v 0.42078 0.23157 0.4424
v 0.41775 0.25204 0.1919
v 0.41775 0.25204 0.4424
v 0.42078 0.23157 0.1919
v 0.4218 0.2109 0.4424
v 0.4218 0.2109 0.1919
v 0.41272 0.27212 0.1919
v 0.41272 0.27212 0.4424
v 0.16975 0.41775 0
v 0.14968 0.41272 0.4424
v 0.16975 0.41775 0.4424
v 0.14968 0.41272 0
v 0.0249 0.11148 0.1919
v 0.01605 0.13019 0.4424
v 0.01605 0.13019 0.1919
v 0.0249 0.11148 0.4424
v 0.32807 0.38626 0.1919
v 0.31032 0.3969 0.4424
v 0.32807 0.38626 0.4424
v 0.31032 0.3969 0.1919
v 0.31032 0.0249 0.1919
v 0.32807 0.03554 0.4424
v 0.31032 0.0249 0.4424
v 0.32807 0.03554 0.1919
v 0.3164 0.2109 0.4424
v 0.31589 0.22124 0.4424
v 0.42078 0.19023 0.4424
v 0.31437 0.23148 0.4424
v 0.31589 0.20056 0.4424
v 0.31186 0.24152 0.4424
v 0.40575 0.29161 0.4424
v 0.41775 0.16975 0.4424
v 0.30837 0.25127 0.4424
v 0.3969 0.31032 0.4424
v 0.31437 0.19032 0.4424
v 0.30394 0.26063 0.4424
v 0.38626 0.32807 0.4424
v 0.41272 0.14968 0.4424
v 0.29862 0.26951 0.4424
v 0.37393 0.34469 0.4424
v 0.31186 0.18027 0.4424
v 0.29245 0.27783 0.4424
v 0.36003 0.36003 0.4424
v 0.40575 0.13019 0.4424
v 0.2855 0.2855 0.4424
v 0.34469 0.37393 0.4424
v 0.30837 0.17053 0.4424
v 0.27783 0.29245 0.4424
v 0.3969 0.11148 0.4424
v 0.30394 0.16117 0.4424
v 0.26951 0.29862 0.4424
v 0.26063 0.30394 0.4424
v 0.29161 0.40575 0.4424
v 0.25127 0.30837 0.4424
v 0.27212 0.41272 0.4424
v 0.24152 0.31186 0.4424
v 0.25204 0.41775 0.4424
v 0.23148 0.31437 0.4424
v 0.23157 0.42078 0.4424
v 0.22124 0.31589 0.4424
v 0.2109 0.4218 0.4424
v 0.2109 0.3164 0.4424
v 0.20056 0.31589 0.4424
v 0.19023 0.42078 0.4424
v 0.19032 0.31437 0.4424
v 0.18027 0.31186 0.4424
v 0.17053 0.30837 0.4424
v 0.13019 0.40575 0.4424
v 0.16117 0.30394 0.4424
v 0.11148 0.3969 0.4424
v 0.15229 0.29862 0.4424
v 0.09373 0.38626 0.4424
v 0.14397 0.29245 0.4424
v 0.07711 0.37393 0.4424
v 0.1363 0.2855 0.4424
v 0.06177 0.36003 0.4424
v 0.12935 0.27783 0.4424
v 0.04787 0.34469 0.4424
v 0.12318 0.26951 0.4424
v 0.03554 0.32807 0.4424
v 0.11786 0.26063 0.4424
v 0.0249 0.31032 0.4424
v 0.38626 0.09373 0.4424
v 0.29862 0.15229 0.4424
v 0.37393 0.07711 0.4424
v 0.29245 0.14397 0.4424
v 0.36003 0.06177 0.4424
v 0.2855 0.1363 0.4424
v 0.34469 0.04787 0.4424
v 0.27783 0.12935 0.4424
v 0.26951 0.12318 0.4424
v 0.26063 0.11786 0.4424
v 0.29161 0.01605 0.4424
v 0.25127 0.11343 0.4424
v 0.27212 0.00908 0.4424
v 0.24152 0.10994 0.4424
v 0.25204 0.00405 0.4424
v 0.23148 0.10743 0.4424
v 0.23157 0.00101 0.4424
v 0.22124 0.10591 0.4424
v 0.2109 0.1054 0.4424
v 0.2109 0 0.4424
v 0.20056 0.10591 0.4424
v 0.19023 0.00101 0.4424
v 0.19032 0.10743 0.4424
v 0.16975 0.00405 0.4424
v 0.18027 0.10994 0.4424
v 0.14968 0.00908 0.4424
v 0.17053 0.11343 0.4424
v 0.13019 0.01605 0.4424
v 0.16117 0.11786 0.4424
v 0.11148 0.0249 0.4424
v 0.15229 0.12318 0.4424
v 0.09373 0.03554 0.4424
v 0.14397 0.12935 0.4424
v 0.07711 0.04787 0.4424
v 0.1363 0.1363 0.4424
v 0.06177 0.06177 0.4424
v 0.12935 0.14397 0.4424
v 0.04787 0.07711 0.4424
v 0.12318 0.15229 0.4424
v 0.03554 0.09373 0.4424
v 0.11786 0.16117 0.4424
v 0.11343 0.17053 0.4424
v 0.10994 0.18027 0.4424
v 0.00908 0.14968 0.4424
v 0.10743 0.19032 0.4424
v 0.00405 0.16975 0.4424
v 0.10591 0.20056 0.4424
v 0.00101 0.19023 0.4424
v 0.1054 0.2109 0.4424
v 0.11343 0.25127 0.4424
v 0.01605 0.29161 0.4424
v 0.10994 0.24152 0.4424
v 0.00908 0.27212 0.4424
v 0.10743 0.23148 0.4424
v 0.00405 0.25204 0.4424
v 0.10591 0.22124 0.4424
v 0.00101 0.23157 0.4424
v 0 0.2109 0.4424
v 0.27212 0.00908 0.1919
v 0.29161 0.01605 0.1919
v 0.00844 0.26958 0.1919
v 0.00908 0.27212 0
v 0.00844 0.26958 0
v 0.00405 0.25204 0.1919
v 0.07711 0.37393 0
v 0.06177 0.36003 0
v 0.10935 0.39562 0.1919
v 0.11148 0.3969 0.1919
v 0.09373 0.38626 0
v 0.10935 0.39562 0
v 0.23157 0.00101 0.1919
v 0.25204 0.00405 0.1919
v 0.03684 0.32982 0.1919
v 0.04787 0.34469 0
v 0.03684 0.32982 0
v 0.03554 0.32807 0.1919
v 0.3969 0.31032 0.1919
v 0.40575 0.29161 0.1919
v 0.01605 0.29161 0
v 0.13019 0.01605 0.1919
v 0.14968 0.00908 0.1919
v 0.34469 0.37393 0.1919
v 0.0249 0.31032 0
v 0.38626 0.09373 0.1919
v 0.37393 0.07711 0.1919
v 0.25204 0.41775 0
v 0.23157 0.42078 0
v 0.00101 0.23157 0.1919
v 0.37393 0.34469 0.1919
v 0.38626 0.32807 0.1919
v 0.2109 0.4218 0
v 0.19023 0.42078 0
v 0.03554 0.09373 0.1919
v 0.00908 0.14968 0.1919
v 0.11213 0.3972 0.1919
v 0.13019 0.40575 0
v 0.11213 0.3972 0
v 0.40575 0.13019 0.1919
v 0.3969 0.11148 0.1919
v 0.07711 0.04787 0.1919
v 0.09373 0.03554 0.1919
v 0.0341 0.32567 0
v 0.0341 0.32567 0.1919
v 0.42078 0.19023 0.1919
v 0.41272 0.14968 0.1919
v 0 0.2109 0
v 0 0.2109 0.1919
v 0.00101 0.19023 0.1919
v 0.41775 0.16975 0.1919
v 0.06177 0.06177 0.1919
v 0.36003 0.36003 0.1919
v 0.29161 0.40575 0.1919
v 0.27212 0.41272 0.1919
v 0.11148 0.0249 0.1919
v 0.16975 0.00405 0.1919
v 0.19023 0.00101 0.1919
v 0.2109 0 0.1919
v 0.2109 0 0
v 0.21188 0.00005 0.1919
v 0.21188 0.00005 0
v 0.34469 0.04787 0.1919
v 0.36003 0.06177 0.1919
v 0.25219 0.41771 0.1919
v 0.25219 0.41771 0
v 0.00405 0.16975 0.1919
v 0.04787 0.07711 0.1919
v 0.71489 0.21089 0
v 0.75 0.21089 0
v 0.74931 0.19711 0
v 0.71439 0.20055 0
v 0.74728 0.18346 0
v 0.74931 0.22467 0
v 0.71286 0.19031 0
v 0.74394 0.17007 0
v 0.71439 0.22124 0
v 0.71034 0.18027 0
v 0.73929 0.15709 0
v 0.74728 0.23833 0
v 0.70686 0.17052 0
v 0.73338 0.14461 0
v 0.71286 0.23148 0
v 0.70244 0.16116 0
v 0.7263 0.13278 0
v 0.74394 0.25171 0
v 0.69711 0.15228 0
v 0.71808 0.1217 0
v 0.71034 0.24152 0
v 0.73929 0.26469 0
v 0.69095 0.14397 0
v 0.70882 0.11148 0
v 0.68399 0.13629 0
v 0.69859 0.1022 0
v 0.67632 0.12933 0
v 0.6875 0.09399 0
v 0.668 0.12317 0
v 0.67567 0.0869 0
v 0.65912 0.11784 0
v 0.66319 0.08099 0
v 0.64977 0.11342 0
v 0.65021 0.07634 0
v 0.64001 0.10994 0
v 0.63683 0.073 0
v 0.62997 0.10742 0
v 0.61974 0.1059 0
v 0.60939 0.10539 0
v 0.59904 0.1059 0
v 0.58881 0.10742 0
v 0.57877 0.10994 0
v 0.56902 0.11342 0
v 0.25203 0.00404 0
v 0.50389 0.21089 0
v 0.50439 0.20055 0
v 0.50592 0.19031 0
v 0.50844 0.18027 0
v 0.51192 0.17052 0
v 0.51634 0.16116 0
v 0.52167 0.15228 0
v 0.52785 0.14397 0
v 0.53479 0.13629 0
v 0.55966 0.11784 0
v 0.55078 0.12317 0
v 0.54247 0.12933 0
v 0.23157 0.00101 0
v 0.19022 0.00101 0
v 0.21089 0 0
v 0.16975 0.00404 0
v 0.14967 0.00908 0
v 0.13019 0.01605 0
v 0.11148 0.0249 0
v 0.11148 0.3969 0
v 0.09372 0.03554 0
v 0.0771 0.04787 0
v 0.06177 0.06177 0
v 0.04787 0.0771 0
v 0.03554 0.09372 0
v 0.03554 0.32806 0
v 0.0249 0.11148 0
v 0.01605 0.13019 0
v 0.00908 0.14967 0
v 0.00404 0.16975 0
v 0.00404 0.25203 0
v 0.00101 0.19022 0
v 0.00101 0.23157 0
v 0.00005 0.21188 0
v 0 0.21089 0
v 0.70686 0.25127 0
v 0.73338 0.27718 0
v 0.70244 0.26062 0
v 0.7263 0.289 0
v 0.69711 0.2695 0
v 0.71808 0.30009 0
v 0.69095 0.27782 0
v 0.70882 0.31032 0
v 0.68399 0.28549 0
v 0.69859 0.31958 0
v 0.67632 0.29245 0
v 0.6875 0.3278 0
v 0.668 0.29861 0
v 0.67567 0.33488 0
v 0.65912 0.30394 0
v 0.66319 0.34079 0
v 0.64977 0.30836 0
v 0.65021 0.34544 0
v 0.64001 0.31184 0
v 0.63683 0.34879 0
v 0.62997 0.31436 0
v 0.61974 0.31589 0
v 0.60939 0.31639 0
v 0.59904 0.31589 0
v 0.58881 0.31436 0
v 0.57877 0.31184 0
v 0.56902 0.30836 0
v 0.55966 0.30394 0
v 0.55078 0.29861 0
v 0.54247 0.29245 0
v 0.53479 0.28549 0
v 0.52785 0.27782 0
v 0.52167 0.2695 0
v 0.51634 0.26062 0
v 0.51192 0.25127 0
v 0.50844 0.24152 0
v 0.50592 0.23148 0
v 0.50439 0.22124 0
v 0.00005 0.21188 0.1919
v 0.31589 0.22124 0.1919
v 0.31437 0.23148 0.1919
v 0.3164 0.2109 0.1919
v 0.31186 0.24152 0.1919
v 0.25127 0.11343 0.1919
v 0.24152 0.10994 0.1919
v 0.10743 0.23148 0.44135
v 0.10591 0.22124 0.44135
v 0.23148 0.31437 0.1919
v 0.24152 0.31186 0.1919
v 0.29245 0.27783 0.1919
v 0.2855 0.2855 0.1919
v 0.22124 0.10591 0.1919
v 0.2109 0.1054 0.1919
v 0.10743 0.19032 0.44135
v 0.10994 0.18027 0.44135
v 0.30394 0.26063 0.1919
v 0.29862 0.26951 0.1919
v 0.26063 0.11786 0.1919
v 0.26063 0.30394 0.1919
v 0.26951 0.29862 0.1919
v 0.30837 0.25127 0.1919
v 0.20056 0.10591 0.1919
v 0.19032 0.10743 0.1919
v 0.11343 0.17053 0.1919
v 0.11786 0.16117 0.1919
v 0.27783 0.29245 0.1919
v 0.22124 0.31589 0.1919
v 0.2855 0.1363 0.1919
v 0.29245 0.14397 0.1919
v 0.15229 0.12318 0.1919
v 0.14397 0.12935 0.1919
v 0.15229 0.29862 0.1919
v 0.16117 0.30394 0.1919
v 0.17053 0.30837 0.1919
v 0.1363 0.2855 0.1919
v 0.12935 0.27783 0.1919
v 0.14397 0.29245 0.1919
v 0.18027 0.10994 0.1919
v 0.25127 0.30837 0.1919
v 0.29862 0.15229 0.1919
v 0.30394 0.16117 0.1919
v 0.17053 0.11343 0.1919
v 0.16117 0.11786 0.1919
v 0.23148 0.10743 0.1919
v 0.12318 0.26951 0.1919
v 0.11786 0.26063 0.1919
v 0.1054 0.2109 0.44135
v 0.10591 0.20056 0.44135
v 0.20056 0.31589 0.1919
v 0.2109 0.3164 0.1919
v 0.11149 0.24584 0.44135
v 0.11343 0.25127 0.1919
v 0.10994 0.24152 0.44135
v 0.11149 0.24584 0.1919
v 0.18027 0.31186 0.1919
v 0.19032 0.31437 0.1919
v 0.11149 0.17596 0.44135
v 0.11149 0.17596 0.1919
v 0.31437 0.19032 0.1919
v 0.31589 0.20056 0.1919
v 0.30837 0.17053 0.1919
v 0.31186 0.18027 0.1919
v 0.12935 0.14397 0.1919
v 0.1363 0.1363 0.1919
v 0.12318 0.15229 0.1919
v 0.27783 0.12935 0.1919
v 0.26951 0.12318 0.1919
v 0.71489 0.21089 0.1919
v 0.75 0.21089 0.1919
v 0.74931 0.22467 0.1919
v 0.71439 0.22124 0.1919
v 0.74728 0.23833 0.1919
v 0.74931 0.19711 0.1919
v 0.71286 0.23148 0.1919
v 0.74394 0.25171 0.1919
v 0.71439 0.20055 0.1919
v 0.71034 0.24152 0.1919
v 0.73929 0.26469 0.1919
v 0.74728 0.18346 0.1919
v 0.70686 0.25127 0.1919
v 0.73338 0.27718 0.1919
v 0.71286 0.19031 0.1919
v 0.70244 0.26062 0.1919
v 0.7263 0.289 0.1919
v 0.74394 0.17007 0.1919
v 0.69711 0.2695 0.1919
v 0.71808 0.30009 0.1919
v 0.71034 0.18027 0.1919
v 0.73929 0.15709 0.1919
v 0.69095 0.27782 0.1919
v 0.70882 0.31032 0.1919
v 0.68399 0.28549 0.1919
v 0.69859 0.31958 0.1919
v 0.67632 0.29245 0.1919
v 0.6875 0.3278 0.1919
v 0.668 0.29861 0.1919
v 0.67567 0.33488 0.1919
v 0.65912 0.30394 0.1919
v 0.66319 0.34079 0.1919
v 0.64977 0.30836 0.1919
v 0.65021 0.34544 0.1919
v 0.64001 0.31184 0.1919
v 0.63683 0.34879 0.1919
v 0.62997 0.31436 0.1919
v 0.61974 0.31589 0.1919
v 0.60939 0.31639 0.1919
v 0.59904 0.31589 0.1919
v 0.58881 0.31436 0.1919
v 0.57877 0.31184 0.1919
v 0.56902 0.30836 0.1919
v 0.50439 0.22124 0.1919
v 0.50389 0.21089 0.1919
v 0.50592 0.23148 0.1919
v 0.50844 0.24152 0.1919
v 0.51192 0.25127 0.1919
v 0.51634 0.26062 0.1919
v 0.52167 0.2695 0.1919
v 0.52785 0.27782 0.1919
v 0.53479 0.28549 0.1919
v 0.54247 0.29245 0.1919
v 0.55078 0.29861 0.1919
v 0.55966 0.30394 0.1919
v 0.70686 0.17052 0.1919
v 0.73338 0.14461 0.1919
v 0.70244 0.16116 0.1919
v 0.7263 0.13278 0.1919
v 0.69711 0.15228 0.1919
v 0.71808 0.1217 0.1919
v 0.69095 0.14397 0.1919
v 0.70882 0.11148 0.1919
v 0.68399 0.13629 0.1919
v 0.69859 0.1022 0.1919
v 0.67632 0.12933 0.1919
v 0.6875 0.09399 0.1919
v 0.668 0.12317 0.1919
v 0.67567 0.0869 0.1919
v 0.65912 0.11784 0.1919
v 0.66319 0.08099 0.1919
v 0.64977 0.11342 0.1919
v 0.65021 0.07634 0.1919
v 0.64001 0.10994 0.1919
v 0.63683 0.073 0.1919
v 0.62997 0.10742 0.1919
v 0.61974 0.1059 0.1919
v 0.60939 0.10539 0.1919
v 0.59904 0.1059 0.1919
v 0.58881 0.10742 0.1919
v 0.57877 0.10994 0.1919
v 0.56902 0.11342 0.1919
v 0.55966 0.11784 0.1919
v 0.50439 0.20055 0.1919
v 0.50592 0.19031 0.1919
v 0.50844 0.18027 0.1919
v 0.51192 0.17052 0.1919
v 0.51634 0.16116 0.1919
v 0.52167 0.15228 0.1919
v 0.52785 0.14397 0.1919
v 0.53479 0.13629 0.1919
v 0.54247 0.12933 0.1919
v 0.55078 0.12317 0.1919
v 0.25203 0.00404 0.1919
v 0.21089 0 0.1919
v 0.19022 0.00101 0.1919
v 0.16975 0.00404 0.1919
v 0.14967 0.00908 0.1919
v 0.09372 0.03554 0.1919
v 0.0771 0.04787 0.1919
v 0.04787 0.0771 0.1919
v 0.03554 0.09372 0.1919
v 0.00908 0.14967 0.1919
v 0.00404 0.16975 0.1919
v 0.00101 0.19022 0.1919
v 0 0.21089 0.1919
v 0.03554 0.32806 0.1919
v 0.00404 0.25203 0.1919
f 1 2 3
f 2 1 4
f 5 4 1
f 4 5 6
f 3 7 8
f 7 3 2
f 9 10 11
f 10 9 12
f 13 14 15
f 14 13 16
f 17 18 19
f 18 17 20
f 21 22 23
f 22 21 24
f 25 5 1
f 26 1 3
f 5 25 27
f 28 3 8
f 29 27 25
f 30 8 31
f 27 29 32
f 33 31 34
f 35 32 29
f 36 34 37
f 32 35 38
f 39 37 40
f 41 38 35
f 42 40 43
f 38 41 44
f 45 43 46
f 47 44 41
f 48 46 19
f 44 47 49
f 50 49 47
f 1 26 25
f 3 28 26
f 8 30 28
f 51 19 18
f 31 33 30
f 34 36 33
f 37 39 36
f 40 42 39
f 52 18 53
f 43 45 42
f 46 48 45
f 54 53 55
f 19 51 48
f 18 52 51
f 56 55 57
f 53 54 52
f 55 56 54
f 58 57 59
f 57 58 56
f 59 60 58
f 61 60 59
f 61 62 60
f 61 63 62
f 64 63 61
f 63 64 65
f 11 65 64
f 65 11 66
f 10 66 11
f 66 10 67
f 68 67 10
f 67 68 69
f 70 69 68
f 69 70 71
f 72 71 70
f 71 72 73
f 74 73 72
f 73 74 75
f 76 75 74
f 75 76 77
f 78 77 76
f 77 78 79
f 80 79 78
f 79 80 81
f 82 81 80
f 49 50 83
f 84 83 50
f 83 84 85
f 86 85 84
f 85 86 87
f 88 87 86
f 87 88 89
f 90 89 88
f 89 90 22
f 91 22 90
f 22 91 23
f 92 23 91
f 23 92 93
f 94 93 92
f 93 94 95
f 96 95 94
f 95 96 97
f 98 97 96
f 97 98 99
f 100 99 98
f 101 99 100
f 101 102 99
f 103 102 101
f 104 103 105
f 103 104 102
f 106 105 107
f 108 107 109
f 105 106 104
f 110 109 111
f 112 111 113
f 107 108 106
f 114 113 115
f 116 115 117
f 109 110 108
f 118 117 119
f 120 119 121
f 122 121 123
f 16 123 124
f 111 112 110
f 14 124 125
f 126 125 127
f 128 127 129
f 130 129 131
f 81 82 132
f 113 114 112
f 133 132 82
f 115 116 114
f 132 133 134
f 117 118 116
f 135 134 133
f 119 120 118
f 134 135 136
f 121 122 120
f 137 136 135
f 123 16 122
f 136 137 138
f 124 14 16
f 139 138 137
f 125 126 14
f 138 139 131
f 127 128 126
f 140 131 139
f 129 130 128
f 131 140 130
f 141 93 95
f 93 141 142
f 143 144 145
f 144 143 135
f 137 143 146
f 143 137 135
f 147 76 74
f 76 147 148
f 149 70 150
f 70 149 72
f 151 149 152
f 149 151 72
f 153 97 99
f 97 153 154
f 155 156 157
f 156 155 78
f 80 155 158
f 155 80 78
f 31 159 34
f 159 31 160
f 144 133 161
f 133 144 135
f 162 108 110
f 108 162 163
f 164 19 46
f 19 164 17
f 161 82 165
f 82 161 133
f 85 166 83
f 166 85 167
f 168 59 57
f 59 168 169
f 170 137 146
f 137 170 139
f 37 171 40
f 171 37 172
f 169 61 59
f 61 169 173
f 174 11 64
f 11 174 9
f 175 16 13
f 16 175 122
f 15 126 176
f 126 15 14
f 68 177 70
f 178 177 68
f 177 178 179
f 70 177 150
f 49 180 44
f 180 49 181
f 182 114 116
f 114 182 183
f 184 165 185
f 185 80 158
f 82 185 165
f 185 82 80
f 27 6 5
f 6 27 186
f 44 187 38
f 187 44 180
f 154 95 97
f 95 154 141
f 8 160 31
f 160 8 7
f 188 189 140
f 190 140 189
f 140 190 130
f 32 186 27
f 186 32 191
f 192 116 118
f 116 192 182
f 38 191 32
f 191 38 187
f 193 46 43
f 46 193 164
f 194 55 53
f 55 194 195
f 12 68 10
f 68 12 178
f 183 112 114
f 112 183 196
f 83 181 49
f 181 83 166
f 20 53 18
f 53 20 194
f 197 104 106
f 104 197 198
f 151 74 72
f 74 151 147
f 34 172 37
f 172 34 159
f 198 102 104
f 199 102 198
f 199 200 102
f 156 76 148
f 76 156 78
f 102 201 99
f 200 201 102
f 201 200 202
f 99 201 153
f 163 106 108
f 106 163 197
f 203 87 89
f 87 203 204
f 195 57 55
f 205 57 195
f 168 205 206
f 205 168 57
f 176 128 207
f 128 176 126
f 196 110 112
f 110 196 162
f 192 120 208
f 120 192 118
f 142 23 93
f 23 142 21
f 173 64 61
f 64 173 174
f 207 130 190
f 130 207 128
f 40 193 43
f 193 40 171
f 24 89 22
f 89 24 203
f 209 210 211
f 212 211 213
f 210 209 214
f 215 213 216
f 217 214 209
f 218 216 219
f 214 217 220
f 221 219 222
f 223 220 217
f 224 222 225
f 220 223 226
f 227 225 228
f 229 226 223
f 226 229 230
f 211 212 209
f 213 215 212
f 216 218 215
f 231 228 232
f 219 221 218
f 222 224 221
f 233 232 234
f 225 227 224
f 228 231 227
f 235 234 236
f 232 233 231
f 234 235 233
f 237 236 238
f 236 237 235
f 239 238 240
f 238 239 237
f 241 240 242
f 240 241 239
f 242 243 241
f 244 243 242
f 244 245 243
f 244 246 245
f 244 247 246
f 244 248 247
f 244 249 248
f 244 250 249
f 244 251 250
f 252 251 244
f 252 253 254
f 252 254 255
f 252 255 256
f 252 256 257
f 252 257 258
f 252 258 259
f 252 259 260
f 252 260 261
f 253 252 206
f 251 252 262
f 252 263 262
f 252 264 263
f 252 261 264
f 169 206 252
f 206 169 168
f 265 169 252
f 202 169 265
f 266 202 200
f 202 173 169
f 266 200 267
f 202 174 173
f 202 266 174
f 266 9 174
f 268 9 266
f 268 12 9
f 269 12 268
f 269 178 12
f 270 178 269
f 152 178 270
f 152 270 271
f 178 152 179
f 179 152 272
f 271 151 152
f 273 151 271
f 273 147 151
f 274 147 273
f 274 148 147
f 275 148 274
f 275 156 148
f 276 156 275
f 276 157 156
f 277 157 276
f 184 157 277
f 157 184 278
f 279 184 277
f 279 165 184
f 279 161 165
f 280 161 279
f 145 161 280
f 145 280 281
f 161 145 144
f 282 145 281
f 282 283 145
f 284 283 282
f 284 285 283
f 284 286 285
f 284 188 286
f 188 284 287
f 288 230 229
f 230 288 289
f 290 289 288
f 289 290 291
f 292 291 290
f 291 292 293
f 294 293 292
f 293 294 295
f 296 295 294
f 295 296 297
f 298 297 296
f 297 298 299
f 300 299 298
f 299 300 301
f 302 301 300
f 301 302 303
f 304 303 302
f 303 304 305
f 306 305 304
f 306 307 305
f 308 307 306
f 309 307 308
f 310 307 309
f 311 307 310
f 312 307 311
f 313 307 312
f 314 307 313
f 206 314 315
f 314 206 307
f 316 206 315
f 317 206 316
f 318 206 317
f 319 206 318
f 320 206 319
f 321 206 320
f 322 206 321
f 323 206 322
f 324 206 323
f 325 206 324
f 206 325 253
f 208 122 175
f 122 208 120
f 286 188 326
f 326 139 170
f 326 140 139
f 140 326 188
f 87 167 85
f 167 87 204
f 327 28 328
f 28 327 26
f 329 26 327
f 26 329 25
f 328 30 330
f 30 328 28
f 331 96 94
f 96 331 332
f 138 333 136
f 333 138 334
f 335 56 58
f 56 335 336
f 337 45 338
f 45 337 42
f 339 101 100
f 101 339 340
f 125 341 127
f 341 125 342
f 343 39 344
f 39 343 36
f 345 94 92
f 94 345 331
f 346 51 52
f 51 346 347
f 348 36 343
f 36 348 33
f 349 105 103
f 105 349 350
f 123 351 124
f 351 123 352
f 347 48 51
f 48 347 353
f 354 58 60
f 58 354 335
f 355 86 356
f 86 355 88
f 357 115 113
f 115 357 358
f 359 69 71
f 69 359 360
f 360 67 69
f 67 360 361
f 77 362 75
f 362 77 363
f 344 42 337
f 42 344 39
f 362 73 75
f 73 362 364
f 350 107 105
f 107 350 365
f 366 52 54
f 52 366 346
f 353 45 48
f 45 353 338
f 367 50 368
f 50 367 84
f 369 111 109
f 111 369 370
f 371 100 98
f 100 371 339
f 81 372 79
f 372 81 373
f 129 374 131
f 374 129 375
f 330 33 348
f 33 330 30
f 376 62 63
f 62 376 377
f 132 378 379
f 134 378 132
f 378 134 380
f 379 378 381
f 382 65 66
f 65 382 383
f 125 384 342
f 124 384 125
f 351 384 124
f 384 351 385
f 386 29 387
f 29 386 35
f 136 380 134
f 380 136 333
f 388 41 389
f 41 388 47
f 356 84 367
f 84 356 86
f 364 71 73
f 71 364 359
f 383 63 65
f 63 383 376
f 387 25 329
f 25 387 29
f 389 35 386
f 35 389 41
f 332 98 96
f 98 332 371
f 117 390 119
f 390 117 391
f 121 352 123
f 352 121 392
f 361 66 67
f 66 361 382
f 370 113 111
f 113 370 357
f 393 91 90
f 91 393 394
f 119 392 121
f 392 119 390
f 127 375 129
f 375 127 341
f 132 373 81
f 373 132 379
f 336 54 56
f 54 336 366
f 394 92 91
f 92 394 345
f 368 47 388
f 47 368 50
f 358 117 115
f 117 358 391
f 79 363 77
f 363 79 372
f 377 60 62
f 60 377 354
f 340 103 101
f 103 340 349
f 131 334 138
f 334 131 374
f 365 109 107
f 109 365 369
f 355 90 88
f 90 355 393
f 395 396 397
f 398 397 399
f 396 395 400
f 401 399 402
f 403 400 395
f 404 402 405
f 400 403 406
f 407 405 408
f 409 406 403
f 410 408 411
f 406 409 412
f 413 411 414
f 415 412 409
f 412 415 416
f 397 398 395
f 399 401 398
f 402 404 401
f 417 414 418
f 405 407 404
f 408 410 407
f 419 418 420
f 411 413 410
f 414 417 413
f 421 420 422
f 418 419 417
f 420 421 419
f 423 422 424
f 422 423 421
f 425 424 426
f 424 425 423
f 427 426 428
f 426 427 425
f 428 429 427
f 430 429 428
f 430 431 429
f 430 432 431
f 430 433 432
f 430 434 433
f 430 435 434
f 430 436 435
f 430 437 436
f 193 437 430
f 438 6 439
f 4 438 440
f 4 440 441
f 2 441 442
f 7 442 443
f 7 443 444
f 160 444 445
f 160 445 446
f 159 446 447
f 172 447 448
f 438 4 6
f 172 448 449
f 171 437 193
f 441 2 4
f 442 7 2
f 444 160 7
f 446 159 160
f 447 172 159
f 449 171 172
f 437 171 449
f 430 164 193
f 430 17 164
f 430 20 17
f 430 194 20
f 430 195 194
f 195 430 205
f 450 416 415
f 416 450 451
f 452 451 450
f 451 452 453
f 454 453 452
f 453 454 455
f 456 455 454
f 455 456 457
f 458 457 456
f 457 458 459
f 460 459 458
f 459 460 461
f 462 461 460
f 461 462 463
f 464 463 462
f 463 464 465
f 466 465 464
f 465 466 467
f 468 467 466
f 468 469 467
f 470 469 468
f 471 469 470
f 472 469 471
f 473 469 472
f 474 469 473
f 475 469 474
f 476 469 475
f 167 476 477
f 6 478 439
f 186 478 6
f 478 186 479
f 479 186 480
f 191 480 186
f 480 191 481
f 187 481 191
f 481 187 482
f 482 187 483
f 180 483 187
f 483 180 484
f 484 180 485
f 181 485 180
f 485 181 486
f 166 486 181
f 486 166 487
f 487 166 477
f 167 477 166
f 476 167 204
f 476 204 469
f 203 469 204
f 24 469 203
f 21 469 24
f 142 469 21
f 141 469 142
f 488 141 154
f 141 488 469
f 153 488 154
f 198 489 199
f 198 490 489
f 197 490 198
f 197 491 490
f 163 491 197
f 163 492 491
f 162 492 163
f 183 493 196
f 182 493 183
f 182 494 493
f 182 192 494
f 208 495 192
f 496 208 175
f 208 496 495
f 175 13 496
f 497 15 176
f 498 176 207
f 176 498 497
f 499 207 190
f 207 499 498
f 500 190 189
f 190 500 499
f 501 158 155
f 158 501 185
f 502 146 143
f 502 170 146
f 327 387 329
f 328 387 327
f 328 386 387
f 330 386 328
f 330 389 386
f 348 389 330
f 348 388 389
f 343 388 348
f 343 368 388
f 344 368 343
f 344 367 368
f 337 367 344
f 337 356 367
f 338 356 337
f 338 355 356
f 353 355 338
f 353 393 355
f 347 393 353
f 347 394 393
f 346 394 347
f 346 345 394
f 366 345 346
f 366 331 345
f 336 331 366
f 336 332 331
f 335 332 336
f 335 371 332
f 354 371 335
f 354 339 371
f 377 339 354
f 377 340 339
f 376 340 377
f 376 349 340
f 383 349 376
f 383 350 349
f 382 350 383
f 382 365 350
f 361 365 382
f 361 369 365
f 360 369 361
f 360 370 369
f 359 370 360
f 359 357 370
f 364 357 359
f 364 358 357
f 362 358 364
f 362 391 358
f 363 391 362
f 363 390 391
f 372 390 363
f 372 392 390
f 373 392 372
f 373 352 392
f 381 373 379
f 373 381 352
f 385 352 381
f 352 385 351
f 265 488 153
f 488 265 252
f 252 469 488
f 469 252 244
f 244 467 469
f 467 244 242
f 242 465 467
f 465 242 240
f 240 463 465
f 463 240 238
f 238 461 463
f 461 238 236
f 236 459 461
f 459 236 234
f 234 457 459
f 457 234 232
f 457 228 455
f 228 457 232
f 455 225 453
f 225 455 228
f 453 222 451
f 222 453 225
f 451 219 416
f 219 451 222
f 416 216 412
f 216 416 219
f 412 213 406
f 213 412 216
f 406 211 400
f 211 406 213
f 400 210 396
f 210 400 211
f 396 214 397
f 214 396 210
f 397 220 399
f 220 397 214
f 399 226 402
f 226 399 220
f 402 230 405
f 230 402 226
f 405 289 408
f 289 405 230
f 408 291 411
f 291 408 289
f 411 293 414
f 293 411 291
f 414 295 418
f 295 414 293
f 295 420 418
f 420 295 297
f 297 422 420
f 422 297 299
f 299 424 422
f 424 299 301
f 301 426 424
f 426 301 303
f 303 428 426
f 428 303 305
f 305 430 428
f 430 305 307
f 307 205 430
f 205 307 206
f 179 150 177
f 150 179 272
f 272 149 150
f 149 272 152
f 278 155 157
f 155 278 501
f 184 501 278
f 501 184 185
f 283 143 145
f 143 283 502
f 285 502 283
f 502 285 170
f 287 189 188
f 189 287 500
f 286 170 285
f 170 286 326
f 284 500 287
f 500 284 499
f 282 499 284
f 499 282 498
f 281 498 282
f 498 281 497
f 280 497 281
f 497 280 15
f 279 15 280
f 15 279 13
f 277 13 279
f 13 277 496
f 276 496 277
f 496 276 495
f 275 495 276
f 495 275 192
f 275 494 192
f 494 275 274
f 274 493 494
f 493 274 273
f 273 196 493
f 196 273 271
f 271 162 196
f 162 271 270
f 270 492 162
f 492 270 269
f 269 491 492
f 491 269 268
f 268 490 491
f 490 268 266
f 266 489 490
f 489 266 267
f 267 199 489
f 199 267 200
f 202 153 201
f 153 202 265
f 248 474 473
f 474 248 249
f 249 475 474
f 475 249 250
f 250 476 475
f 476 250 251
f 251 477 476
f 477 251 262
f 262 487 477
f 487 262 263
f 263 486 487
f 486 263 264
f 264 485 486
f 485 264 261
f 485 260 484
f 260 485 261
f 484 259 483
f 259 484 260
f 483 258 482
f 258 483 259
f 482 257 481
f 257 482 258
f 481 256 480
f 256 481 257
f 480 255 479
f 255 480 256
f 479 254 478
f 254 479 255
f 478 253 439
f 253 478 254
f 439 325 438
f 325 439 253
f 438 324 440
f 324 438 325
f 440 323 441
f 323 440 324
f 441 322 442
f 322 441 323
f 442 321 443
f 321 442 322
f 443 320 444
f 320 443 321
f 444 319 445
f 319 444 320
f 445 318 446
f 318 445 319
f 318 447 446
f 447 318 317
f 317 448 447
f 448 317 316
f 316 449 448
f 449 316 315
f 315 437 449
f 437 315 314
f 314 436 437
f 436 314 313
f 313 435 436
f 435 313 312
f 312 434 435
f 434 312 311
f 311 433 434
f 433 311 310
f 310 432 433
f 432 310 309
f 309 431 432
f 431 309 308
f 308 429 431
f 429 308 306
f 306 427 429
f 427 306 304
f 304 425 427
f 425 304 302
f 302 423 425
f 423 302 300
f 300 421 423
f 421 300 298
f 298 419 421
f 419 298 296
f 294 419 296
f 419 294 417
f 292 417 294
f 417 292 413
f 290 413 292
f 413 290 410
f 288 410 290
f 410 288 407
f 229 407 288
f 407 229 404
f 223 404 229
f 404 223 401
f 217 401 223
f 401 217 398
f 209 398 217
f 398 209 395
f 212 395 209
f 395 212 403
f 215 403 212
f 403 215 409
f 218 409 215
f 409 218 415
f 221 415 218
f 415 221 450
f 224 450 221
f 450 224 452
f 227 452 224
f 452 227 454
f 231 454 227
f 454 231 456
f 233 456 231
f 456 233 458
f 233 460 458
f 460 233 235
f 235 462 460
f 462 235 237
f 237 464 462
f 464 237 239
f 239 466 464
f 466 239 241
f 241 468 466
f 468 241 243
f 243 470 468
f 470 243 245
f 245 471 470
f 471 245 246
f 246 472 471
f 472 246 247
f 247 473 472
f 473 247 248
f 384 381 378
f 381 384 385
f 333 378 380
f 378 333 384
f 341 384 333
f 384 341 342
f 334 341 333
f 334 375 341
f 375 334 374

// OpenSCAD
// Global Resolution Setting
$fn = 64;

// --------------------------
// Primary Parameter Definitions
// --------------------------
// Base overall dimensions
base_total_length = 0.75;       // X-axis total span
base_total_width = 0.421875;    // Y-axis total span
lower_base_height = 0.1919;     // Z-height of lower base from datum
upper_left_total_height = 0.4424; // Total Z-height of left upper section from datum

// Left circular feature parameters
left_circle_x = 0.2109;         // X center position from left edge
left_circle_y = 0.2109;         // Y center position from front edge
left_circle_outer_r = 0.2109;   // Outer radius of left circular profile
left_upper_inner_r = 0.1055;    // Inner radius for upper left hollow section
upper_slot_width = 0.04;        // Width of rounded slot interruptions in upper opening

// Right circular feature parameters
right_circle_x = 0.6094;        // X center position from left edge
right_circle_y = 0.2109;        // Y center position from front edge
right_circle_outer_r = 0.1406;  // Outer radius of right circular profile
right_circle_inner_r = 0.1055;  // Inner radius of right base opening

// Upright tab parameters
tab_x_len = 0.041188;           // X dimension of tab
tab_y_width = 0.070313;         // Y dimension of tab
tab_z_height = 0.441346;        // Z height of tab from datum
tab_x_offset = 0.0703;          // Left edge X position from datum
tab_y_offset = 0.1758;          // Front edge Y position from datum

// --------------------------
// Module Definitions
// --------------------------
// 2D profile of lower base with connecting slot and right opening
module lower_base_2d_profile() {
    difference() {
        // Connected outer boundary (hull of left and right outer circles)
        hull() {
            translate([left_circle_x, left_circle_y])
            circle(r = left_circle_outer_r);
            
            translate([right_circle_x, right_circle_y])
            circle(r = right_circle_outer_r);
        }
        // Subtract inner void for right circular feature
        translate([right_circle_x, right_circle_y])
        circle(r = right_circle_inner_r);
    }
}

// Upper left annular section with hollow core and slot interruptions
module upper_left_annular_feature() {
    difference() {
        // Outer solid cylinder (full height from base datum)
        translate([left_circle_x, left_circle_y, 0])
        cylinder(h = upper_left_total_height, r = left_circle_outer_r);
        
        // Inner hollow core (extended to avoid z-fighting)
        translate([left_circle_x, left_circle_y, -0.1])
        cylinder(h = upper_left_total_height + 0.2, r = left_upper_inner_r);
        
        // Rounded slot interruptions (opposite positions)
        for (rot = [0, 180]) {
            rotate(rot)
            translate([left_circle_x, left_circle_y, -0.1])
            linear_extrude(height = upper_left_total_height + 0.2)
            offset(r = upper_slot_width / 2)
            square([0.06, upper_slot_width], center = true);
        }
    }
}

// Upright rectangular tab feature
module upright_tab_feature() {
    translate([tab_x_offset, tab_y_offset, 0])
    cube([tab_x_len, tab_y_width, tab_z_height]);
}

// --------------------------
// Main Model Assembly
// --------------------------
union() {
    // Extrude lower base profile to specified height
    linear_extrude(height = lower_base_height)
    lower_base_2d_profile();
    
    // Add upper left annular section (merges with lower base automatically)
    upper_left_annular_feature();
    
    // Add upright tab
    upright_tab_feature();
}
